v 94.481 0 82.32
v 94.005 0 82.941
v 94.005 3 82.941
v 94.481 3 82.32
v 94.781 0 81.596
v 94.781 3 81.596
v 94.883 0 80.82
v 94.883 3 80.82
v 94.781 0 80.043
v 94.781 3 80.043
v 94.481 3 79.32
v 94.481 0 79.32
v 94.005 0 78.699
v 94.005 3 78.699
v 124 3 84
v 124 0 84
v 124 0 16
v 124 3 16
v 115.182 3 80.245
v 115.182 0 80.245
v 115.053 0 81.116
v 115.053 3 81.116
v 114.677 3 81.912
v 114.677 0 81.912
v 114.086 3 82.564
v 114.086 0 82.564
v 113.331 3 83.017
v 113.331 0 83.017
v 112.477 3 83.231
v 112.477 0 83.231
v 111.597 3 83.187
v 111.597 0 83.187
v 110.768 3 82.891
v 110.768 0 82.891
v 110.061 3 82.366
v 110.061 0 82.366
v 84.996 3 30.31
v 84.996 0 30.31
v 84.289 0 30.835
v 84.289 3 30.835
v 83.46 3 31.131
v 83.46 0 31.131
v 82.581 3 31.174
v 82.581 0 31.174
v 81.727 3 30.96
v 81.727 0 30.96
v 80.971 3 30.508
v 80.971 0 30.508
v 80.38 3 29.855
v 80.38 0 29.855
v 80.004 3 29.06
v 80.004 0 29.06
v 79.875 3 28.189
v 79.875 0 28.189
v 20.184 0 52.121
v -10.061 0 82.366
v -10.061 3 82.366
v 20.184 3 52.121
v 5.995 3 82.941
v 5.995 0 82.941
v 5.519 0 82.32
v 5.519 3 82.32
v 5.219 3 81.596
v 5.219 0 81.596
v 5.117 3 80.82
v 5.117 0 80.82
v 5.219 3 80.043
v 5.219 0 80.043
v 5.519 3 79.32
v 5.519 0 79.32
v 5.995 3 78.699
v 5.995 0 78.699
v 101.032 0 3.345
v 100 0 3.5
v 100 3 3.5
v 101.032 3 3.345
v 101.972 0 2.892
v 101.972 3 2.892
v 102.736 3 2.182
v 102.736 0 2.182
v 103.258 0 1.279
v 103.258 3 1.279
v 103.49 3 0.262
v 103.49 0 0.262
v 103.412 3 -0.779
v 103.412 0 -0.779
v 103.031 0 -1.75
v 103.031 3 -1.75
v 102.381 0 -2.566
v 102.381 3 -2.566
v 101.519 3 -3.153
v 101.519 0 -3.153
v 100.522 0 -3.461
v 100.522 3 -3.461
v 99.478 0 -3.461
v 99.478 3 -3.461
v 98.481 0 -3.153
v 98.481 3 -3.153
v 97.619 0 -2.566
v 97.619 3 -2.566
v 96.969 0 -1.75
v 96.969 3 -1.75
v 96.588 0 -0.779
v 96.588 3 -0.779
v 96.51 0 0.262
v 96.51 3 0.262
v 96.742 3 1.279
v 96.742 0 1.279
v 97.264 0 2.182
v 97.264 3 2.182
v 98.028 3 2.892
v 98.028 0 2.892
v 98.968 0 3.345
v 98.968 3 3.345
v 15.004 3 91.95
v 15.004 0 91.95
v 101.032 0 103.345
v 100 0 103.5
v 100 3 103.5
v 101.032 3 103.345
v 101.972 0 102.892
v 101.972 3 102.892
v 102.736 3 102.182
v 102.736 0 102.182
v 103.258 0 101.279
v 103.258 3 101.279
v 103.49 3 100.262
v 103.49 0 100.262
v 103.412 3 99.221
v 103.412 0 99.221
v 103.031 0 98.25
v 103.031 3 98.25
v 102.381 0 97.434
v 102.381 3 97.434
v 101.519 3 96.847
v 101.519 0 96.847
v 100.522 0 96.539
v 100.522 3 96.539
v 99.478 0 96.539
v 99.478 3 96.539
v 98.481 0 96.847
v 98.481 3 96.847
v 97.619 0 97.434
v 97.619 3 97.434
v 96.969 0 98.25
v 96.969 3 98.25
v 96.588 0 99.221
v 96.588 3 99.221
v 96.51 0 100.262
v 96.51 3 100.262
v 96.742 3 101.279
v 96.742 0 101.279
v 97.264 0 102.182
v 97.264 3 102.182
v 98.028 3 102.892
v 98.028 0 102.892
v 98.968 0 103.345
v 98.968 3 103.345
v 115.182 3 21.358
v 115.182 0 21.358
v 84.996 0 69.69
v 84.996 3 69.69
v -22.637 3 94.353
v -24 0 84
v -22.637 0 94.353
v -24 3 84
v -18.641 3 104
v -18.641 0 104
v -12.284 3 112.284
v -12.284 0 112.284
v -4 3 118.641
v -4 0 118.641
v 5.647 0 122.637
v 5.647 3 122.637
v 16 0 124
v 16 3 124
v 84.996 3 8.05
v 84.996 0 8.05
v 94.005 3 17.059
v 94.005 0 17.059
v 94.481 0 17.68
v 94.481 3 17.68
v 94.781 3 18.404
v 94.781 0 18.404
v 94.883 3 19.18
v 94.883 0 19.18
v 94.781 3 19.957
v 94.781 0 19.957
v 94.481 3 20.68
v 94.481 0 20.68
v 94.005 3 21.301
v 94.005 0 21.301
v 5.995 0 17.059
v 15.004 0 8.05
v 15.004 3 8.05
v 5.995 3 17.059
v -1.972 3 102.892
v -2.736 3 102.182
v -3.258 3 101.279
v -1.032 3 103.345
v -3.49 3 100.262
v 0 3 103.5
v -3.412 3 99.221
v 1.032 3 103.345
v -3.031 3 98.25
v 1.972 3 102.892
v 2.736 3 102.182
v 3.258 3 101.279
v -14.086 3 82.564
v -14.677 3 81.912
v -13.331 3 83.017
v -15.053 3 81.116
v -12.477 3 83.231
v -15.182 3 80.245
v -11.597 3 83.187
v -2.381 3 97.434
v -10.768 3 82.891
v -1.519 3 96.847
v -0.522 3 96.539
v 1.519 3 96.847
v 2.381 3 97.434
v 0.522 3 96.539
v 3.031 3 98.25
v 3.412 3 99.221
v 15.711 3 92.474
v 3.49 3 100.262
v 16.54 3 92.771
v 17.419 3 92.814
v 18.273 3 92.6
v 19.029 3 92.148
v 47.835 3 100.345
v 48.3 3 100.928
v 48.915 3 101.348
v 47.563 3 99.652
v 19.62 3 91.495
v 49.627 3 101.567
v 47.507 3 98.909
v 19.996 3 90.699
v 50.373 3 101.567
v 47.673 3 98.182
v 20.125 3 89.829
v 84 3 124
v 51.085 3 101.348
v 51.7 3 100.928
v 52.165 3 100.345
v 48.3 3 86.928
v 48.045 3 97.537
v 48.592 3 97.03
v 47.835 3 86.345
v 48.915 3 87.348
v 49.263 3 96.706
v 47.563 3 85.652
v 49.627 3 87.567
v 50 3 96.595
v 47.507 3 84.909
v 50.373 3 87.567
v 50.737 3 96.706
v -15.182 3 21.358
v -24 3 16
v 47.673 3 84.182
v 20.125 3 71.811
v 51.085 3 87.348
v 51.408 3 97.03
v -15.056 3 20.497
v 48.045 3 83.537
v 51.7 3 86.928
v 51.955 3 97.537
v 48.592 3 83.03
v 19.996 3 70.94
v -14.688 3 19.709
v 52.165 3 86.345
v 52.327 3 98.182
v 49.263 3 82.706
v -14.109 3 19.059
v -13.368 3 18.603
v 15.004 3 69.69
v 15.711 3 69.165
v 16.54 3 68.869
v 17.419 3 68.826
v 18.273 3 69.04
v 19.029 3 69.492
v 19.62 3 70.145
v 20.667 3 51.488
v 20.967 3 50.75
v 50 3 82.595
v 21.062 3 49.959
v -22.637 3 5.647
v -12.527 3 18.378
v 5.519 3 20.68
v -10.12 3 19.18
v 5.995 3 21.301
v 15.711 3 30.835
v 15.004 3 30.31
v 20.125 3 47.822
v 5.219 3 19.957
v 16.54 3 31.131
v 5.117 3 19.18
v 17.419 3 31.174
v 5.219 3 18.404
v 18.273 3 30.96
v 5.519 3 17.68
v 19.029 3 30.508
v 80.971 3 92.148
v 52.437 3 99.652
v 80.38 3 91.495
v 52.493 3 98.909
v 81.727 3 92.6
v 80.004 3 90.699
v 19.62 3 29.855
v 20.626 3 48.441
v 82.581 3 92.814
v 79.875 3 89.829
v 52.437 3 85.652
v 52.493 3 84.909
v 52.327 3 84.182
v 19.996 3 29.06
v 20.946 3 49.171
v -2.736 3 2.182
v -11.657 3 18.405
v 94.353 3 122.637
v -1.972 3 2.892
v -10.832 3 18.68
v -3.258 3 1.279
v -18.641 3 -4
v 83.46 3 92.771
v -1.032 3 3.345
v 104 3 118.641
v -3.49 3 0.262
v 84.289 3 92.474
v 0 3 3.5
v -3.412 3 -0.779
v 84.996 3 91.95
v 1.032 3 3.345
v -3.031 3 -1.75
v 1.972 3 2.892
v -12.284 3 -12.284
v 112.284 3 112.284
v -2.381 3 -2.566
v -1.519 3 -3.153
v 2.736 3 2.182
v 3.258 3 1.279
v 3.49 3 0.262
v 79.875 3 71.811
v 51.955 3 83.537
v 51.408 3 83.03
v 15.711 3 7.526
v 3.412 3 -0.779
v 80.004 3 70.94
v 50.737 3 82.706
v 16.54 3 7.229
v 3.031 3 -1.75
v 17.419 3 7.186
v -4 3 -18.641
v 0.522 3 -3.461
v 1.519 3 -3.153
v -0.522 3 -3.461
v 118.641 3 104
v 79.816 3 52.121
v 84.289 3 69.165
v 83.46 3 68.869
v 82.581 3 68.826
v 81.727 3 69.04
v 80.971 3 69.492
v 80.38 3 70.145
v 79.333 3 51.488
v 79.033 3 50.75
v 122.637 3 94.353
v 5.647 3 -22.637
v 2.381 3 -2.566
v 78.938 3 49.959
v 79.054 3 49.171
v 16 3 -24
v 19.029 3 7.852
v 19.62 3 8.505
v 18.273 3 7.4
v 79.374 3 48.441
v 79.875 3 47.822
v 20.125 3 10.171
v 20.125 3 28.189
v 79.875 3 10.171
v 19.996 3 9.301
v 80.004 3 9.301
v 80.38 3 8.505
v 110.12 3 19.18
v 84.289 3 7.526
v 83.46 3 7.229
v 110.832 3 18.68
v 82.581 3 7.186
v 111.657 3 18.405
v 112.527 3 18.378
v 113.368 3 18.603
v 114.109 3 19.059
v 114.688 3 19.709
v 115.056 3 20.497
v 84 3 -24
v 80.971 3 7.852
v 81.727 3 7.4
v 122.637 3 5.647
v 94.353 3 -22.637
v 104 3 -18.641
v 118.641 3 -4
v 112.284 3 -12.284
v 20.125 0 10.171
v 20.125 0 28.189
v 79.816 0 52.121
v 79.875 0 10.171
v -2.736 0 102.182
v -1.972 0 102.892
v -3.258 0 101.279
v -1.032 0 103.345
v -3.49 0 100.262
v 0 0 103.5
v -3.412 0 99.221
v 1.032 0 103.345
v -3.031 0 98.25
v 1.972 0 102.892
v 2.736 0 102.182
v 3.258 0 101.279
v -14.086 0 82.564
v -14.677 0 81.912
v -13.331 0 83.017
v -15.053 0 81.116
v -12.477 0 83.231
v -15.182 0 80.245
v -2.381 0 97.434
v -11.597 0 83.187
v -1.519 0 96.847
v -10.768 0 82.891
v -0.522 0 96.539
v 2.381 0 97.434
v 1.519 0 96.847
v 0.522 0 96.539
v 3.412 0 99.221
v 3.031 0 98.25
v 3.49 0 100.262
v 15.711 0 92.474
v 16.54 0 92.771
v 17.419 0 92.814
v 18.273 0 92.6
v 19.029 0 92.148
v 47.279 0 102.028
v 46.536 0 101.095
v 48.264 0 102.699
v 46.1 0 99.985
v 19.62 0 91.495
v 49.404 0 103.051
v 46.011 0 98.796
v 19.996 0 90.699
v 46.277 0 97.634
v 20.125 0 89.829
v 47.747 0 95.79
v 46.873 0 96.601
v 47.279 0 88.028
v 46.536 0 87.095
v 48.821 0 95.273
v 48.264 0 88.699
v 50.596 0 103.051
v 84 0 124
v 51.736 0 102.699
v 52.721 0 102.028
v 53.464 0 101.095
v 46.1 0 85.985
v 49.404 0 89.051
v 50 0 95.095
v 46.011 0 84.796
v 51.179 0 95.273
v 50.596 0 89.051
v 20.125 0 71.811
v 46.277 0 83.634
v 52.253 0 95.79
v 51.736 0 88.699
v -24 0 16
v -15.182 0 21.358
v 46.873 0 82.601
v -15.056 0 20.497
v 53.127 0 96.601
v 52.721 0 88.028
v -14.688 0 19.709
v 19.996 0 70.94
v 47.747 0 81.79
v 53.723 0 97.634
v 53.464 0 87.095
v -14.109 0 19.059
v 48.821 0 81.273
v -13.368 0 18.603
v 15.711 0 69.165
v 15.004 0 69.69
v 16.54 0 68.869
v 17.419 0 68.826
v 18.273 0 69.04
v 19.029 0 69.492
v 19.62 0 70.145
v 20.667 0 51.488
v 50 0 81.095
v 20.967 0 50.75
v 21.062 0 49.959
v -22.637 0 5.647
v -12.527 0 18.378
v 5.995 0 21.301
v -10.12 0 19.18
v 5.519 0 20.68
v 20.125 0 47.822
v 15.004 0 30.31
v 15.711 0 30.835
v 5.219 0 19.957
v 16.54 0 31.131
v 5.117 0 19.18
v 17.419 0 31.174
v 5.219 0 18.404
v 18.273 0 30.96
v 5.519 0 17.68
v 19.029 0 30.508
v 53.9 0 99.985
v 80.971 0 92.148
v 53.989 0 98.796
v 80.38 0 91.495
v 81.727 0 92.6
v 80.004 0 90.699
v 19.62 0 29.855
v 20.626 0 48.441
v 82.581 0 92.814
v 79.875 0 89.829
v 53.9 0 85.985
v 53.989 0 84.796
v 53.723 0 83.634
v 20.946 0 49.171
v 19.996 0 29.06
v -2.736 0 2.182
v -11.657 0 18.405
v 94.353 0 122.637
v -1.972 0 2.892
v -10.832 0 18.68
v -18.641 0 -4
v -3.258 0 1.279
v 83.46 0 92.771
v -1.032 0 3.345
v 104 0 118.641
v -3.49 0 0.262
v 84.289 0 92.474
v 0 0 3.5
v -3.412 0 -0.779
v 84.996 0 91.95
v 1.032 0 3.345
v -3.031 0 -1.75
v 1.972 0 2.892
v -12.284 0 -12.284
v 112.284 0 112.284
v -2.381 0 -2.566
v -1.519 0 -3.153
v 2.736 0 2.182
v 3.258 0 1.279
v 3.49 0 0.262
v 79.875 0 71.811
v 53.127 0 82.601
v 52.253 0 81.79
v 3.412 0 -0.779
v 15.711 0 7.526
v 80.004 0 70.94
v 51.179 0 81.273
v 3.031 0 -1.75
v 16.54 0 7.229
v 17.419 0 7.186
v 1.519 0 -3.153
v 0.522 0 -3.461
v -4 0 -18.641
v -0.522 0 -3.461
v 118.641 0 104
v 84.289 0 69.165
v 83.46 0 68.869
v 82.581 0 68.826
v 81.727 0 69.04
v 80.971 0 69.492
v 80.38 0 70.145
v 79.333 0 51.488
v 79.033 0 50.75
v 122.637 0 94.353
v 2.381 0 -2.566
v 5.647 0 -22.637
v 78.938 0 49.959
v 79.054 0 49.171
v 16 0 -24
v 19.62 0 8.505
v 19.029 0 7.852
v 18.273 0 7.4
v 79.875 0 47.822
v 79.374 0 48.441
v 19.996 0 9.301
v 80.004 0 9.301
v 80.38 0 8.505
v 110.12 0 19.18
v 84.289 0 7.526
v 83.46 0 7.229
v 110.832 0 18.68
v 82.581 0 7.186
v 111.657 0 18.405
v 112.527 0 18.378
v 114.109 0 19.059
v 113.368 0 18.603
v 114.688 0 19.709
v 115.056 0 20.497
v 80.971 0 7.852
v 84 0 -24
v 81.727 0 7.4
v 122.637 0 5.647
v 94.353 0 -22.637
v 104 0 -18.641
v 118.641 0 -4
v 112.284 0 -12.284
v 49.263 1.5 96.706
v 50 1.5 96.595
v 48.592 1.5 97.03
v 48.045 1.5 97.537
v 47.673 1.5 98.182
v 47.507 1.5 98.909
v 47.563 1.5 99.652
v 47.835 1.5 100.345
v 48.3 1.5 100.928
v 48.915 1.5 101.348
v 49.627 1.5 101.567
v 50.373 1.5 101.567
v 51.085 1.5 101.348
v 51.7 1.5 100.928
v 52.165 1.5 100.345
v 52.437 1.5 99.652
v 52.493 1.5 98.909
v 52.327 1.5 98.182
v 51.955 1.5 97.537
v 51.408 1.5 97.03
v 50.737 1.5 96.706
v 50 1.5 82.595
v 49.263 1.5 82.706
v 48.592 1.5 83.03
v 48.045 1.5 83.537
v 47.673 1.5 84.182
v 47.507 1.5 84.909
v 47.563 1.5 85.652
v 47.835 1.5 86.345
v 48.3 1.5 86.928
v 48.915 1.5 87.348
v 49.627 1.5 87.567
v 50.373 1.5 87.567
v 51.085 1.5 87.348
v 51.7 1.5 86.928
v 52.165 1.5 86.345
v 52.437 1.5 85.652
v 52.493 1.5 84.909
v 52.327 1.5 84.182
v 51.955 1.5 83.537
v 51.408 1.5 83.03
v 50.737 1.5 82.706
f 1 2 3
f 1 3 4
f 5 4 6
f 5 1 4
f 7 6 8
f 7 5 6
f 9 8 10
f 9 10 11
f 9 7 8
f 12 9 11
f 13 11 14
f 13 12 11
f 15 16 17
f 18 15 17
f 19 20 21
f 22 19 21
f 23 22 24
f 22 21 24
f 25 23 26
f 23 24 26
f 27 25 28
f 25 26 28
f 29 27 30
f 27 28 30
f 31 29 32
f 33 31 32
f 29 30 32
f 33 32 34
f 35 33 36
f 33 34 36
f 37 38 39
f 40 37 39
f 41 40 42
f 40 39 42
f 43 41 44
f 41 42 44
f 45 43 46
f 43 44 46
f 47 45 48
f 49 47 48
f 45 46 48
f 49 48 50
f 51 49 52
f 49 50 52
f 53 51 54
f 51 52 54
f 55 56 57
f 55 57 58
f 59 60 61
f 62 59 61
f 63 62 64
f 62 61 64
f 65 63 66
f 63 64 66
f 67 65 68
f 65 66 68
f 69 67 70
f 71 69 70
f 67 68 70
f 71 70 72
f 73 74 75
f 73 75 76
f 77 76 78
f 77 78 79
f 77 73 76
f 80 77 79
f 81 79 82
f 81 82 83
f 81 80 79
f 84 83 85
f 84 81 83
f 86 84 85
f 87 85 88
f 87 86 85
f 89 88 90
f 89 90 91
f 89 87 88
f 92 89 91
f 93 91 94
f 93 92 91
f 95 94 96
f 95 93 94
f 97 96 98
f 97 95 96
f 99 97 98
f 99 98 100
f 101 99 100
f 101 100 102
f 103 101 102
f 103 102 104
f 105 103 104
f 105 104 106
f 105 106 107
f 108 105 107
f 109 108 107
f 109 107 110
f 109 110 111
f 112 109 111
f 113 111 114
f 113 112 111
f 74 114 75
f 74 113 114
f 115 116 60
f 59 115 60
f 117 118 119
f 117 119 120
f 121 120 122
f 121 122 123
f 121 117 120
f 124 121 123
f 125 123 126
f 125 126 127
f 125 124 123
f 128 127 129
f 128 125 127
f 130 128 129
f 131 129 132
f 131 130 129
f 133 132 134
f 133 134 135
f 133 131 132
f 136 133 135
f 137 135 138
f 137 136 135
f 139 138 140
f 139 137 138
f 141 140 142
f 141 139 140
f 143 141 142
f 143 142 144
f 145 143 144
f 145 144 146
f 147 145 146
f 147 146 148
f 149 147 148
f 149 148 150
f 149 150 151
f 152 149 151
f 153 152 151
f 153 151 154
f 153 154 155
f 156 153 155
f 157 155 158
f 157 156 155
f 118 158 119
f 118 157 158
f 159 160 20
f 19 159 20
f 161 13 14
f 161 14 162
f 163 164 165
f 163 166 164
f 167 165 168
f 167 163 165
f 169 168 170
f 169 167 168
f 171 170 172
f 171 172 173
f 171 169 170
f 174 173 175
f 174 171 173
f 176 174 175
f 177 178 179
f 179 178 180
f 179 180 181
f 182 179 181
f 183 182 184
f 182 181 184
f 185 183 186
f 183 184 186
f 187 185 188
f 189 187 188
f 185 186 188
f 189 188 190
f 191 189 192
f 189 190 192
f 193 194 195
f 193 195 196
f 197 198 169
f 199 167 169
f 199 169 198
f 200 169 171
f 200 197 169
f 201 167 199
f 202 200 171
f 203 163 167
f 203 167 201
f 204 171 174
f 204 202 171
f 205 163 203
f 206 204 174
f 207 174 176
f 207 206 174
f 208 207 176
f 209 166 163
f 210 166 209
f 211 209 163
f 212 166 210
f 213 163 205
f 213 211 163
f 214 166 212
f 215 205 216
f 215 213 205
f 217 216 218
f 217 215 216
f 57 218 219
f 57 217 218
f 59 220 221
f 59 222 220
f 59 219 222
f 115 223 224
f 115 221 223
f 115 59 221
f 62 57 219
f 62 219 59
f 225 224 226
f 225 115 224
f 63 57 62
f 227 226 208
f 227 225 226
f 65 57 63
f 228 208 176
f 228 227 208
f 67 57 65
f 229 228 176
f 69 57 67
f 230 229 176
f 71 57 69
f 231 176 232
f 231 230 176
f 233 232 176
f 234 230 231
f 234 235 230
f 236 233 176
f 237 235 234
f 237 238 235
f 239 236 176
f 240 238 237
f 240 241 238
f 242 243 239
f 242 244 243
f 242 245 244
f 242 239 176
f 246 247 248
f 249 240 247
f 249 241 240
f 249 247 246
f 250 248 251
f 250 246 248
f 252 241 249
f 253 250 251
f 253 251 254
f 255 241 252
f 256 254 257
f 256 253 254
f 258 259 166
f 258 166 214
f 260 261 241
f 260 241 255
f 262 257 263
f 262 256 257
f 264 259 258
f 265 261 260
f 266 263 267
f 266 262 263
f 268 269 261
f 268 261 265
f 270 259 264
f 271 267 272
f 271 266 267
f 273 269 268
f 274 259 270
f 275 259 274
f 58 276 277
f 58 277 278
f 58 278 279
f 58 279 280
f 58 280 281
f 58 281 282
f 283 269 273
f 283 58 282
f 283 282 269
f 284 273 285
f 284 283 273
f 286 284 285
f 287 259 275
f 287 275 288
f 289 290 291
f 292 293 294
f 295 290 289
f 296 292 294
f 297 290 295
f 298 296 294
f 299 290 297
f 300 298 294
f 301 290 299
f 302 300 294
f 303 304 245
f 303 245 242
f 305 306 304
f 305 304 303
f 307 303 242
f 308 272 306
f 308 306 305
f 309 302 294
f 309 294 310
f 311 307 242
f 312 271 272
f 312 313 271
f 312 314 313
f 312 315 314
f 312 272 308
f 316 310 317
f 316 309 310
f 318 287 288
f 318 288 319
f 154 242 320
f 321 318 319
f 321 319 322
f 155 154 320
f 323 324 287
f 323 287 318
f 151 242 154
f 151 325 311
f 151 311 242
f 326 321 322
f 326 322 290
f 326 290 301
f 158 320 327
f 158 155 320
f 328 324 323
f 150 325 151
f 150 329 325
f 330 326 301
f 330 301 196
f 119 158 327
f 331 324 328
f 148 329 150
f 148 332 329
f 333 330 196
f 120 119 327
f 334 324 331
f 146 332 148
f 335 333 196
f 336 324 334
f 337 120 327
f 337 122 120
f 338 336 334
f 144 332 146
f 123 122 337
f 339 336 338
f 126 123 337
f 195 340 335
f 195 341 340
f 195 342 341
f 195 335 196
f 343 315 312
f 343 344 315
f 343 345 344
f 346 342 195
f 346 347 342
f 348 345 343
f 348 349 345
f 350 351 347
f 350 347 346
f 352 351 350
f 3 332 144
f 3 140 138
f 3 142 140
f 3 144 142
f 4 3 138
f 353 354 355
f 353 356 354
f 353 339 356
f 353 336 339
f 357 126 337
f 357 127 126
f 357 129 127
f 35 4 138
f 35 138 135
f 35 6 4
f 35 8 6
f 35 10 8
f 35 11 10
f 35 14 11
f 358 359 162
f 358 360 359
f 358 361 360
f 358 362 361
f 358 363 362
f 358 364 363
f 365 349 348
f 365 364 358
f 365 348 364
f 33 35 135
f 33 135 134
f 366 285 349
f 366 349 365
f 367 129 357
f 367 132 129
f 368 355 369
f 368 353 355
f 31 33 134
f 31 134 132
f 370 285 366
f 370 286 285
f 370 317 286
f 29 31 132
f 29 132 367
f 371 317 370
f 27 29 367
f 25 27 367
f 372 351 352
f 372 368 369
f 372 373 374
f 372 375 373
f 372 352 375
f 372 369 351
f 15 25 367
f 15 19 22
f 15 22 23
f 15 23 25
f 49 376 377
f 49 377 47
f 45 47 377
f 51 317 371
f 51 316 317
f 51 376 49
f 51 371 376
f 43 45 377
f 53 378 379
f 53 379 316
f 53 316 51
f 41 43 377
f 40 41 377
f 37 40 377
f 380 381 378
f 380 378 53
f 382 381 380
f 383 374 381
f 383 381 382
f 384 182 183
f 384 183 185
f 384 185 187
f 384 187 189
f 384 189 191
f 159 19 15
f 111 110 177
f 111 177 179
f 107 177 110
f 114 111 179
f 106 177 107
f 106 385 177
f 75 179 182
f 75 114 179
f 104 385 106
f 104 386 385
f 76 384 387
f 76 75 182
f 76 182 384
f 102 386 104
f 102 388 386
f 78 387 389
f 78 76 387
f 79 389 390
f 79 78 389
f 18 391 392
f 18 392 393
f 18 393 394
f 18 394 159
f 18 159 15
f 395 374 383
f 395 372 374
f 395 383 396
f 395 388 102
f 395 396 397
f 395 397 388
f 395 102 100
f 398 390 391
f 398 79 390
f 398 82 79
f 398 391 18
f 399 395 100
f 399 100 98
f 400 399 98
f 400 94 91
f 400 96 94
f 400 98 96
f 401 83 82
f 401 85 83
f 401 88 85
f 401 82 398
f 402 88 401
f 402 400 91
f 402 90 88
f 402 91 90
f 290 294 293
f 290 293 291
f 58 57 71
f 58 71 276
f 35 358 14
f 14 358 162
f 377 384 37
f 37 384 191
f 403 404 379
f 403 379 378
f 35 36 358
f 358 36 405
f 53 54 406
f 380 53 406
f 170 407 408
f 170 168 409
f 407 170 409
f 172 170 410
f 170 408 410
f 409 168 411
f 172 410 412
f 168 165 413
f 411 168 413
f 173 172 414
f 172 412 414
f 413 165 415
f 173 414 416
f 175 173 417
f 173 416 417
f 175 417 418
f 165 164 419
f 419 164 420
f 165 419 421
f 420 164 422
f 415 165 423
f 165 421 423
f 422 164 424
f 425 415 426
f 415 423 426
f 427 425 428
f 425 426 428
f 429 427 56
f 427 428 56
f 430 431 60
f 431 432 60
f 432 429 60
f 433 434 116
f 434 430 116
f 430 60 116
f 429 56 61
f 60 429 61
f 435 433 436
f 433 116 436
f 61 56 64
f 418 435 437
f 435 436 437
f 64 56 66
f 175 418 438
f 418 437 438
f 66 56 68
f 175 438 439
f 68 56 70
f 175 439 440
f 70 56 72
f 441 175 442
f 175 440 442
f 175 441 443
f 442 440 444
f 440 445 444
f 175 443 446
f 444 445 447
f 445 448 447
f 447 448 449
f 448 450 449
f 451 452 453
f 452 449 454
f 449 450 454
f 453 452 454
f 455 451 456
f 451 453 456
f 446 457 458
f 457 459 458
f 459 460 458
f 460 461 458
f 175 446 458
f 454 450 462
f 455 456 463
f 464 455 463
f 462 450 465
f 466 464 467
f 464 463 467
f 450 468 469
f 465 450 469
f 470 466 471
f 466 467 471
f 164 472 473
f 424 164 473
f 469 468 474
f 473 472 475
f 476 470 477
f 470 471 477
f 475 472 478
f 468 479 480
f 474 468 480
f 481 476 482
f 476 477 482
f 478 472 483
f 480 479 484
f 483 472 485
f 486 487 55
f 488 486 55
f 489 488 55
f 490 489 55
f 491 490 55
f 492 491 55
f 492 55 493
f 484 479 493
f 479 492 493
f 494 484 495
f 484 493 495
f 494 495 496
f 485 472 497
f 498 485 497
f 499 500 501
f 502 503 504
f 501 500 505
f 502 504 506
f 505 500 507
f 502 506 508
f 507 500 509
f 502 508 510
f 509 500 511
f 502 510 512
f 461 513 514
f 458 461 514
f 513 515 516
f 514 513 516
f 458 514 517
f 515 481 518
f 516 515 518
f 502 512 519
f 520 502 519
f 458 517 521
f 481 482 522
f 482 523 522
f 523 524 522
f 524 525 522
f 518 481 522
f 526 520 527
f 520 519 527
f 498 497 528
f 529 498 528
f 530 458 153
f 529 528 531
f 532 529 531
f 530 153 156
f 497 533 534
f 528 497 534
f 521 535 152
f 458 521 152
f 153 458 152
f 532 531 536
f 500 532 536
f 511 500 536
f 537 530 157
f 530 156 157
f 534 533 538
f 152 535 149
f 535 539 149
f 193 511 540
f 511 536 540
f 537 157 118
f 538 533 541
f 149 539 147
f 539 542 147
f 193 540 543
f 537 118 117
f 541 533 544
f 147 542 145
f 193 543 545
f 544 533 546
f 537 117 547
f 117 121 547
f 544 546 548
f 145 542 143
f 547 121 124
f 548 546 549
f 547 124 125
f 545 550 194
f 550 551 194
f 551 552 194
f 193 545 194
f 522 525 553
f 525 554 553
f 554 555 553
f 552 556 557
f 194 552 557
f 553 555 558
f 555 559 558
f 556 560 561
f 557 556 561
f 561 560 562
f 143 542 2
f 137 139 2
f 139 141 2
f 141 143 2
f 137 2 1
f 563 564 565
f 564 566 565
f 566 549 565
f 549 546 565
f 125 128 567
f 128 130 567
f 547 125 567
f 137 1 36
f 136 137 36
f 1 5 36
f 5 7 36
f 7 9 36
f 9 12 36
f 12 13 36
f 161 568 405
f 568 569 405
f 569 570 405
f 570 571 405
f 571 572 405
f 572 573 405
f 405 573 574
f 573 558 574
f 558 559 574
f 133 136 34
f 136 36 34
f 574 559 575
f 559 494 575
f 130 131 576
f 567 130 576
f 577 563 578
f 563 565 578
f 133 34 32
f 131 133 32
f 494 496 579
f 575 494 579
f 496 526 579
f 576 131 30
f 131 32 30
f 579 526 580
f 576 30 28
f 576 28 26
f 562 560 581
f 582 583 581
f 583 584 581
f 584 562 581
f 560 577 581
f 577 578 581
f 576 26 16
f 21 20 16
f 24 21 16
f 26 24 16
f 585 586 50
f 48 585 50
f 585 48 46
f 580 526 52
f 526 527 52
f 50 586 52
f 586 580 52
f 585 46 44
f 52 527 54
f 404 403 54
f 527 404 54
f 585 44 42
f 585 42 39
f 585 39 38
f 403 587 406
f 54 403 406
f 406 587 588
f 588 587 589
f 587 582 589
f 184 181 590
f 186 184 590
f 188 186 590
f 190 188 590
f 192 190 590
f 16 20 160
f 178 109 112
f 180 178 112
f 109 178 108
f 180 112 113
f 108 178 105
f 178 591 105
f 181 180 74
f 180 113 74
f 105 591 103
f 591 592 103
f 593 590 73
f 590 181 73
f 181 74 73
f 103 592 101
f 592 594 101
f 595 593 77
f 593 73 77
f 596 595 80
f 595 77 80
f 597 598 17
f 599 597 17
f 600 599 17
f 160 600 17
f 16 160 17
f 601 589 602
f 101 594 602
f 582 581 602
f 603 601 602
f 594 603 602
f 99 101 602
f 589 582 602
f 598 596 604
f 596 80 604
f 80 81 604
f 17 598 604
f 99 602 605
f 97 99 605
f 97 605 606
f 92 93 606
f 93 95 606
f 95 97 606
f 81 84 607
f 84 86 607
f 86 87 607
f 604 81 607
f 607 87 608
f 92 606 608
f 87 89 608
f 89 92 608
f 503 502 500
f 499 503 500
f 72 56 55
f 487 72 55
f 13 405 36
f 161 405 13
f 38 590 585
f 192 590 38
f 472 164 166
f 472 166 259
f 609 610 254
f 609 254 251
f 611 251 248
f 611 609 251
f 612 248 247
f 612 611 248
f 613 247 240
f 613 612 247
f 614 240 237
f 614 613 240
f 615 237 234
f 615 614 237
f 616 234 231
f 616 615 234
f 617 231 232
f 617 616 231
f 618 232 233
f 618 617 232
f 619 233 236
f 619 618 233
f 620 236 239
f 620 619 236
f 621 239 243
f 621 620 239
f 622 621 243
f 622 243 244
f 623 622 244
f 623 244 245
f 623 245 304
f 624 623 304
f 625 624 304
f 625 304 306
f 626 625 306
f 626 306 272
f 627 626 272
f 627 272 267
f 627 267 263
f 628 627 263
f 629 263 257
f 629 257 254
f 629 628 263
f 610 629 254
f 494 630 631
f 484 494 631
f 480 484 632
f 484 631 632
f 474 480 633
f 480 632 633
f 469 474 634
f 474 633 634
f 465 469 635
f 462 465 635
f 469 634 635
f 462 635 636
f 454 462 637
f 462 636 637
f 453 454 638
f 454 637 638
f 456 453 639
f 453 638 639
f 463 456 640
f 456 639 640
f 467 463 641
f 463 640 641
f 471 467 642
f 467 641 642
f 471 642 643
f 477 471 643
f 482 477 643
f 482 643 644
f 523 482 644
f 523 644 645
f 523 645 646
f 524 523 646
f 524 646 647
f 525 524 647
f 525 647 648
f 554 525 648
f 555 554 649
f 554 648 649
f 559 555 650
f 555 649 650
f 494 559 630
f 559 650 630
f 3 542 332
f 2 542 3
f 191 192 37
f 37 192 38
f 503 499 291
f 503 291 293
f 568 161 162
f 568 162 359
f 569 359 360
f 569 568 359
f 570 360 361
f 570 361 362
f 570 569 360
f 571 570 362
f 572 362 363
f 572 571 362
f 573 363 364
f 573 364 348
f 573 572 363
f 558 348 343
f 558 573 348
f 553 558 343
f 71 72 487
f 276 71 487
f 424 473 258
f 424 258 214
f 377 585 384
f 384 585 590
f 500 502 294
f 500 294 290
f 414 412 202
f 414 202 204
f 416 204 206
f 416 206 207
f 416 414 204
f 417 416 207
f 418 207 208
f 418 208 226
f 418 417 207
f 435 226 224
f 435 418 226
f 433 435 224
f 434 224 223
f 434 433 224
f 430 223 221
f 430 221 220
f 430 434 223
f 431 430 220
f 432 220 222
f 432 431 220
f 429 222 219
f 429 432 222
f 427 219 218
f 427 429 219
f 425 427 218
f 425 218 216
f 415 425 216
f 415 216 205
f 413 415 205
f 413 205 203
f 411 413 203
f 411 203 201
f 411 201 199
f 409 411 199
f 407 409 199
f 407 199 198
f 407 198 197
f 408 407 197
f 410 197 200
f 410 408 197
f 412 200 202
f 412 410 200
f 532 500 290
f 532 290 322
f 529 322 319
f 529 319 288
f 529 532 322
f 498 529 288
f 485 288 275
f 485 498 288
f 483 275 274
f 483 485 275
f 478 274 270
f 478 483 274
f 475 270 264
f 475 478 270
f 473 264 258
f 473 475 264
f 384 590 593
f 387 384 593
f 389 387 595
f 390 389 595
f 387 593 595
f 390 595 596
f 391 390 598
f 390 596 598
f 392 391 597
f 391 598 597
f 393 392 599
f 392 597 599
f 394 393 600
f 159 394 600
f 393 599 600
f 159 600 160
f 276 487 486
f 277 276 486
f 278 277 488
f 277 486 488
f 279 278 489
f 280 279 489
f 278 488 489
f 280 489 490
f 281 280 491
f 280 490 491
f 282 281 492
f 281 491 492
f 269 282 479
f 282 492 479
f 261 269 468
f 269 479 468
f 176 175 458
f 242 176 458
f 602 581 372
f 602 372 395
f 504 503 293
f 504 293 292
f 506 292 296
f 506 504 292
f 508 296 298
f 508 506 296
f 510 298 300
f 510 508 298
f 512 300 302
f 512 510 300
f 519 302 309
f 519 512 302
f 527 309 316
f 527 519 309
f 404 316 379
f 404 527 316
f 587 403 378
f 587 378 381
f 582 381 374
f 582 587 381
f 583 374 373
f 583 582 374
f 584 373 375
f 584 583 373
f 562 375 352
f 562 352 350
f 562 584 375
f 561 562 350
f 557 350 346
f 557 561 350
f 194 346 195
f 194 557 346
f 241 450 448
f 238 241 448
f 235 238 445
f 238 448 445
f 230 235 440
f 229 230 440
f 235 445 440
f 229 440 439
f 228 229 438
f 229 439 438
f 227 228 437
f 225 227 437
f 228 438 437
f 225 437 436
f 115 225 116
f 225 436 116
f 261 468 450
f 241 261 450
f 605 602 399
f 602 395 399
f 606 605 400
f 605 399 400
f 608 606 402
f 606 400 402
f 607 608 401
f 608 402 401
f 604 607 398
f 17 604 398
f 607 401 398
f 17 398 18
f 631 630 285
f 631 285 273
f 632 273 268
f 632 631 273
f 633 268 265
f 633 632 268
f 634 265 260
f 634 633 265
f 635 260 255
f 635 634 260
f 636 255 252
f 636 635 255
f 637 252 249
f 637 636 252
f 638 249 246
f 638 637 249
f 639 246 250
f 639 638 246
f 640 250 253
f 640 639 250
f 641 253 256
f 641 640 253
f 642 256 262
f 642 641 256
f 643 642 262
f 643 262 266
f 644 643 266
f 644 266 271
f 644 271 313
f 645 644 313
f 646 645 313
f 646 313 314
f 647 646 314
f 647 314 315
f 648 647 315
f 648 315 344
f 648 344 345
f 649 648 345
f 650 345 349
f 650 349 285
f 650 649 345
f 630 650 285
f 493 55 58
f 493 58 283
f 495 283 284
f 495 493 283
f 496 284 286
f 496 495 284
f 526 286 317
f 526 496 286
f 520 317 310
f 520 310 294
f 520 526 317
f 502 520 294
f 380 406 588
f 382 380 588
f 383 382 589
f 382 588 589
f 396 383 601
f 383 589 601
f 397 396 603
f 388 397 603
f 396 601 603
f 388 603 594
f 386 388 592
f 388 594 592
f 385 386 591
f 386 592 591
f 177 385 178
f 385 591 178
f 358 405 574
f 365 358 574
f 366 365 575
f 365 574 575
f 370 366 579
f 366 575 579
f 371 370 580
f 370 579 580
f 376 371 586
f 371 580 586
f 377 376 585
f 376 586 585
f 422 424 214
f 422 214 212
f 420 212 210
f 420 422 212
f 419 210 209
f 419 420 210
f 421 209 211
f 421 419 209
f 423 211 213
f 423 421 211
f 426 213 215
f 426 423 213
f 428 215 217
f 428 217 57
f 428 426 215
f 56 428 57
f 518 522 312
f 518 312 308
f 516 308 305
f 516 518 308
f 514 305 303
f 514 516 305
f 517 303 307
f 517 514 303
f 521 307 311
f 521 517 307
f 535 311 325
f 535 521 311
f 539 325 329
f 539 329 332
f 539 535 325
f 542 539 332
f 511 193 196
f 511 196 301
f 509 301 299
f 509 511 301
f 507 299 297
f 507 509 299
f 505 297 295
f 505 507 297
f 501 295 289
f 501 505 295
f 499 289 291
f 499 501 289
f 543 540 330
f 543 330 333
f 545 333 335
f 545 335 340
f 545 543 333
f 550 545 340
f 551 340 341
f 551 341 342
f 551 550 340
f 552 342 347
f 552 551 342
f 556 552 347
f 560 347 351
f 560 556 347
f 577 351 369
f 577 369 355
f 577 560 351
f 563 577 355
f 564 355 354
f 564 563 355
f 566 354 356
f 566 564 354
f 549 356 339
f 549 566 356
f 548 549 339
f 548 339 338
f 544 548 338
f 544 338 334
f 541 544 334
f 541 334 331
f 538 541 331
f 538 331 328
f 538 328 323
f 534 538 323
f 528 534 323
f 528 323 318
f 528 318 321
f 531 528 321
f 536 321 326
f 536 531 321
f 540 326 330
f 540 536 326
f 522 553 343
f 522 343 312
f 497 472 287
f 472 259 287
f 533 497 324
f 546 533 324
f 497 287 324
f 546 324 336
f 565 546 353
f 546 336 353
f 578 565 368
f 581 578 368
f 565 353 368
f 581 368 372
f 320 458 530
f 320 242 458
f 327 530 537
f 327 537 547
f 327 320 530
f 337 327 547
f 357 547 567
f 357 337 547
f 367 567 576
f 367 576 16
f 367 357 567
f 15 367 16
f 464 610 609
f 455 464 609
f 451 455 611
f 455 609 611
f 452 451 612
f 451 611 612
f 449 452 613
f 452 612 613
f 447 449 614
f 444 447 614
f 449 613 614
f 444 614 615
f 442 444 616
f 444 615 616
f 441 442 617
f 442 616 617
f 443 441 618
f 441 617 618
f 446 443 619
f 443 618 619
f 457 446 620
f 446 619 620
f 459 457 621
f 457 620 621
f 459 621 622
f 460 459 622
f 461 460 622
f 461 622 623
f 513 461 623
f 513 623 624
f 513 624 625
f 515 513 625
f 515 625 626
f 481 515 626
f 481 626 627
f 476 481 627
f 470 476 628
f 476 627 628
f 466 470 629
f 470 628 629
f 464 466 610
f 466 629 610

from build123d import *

# Parameters (mm, degrees)
SKETCH2_W           = 148
SKETCH2_H           = 148
SKETCH2_R           = 3.5
SKETCH2_R_2         = 2.5
BOSS_EXTRUDE1_DEPTH = 3
FILLET1_R           = 40
CHAMFER1_SIZE       = 1.5
SKETCH3_W           = 25.243080612
SKETCH3_H           = 38.292469741
BOSS_EXTRUDE2_DEPTH = 3


with BuildPart() as part:
    # Sketch2 → Boss-Extrude1 (new body)
    with BuildSketch(Plane(origin=(0, 0, 0), x_dir=(1, 0, 0), z_dir=(0, 1, 0))):
        with Locations((50, -50)):
            Rectangle(SKETCH2_W, SKETCH2_H)
        with Locations(Location((0, 0, 0), (0, 0, 270))):
            Circle(SKETCH2_R, mode=Mode.SUBTRACT)
        with Locations(Location((0, -100, 0), (0, 0, 270))):
            Circle(SKETCH2_R, mode=Mode.SUBTRACT)
        with Locations(Location((100, 0, 0), (0, 0, 270))):
            Circle(SKETCH2_R, mode=Mode.SUBTRACT)
        with Locations(Location((100, -100, 0), (0, 0, 270))):
            Circle(SKETCH2_R, mode=Mode.SUBTRACT)
        with Locations(Location((50, -0.904618286, 0), (0, 0, 270))):
            Circle(SKETCH2_R_2, mode=Mode.SUBTRACT)
        with Locations(Location((50, -14.904618286, 0), (0, 0, 270))):
            Circle(SKETCH2_R_2, mode=Mode.SUBTRACT)
        with Locations(Location((50, -99.095381714, 0), (0, 0, 90))):
            Circle(SKETCH2_R_2, mode=Mode.SUBTRACT)
        with Locations(Location((50, -85.095381714, 0), (0, 0, 90))):
            Circle(SKETCH2_R_2, mode=Mode.SUBTRACT)
        with BuildLine():
            Line((-15.182460642, -21.358338014), (-15.182460642, -80.245012021))
            ThreePointArc((-15.182460642, -80.245012021), (-13.330510939, -83.016650619), (-10.061140298, -82.366332365))
            Line((-10.061140298, -82.366332365), (20.183871723, -52.121320344))
            ThreePointArc((20.183871723, -52.121320344), (21.062273515, -49.959169765), (20.125348516, -47.821728214))
            Line((20.125348516, -47.821728214), (-10.119663505, -19.180066228))
            ThreePointArc((-10.119663505, -19.180066228), (-13.368126824, -18.602581184), (-15.182460642, -21.358338014))
        make_face(mode=Mode.SUBTRACT)
        with BuildLine():
            Line((110.061140298, -82.366332365), (79.816128277, -52.121320344))
            ThreePointArc((79.816128277, -52.121320344), (78.937726485, -49.959169765), (79.874651484, -47.821728214))
            Line((79.874651484, -47.821728214), (110.119663505, -19.180066228))
            ThreePointArc((110.119663505, -19.180066228), (113.368126824, -18.602581184), (115.182460642, -21.358338014))
            Line((115.182460642, -21.358338014), (115.182460642, -80.245012021))
            ThreePointArc((115.182460642, -80.245012021), (113.330510939, -83.016650619), (110.061140298, -82.366332365))
        make_face(mode=Mode.SUBTRACT)
        with BuildLine():
            Line((5.995336985, -21.301386572), (15.004028172, -30.310077759))
            ThreePointArc((15.004028172, -30.310077759), (18.273398813, -30.960396013), (20.125348516, -28.188757415))
            Line((20.125348516, -28.188757415), (20.125348516, -10.171375041))
            ThreePointArc((20.125348516, -10.171375041), (18.273398813, -7.399736444), (15.004028172, -8.050054698))
            Line((15.004028172, -8.050054698), (5.995336985, -17.058745885))
            ThreePointArc((5.995336985, -17.058745885), (5.116657329, -19.180066228), (5.995336985, -21.301386572))
        make_face(mode=Mode.SUBTRACT)
        with BuildLine():
            Line((5.995336985, -78.698613428), (15.004028172, -69.689922241))
            ThreePointArc((15.004028172, -69.689922241), (18.273398813, -69.039603987), (20.125348516, -71.811242585))
            Line((20.125348516, -71.811242585), (20.125348516, -89.828624959))
            ThreePointArc((20.125348516, -89.828624959), (18.273398813, -92.600263556), (15.004028172, -91.949945302))
            Line((15.004028172, -91.949945302), (5.995336985, -82.941254115))
            ThreePointArc((5.995336985, -82.941254115), (5.116657329, -80.819933772), (5.995336985, -78.698613428))
        make_face(mode=Mode.SUBTRACT)
        with BuildLine():
            Line((79.874651484, -71.811242585), (79.874651484, -89.828624959))
            ThreePointArc((79.874651484, -89.828624959), (81.726601187, -92.600263556), (84.995971828, -91.949945302))
            Line((84.995971828, -91.949945302), (94.004663015, -82.941254115))
            ThreePointArc((94.004663015, -82.941254115), (94.883342671, -80.819933772), (94.004663015, -78.698613428))
            Line((94.004663015, -78.698613428), (84.995971828, -69.689922241))
            ThreePointArc((84.995971828, -69.689922241), (81.726601187, -69.039603987), (79.874651484, -71.811242585))
        make_face(mode=Mode.SUBTRACT)
        with BuildLine():
            Line((94.004663015, -21.301386572), (84.995971828, -30.310077759))
            ThreePointArc((84.995971828, -30.310077759), (81.726601187, -30.960396013), (79.874651484, -28.188757415))
            Line((79.874651484, -28.188757415), (79.874651484, -10.171375041))
            ThreePointArc((79.874651484, -10.171375041), (81.726601187, -7.399736444), (84.995971828, -8.050054698))
            Line((84.995971828, -8.050054698), (94.004663015, -17.058745885))
            ThreePointArc((94.004663015, -17.058745885), (94.883342671, -19.180066228), (94.004663015, -21.301386572))
        make_face(mode=Mode.SUBTRACT)
    extrude(amount=BOSS_EXTRUDE1_DEPTH)

    # Fillet1
    fillet1_edges = [part.edges().sort_by_distance(p)[0] for p in [
        (124, 1.5, 124),
        (-24, 1.5, 124),
        (-24, 1.5, -24),
        (124, 1.5, -24),
    ]]
    fillet(fillet1_edges, radius=FILLET1_R)

    # Chamfer1
    chamfer1_edges = [part.edges().sort_by_distance(p)[0] for p in [
        (50, 0, -1.595381714),
        (50, 0, 12.404618286),
        (50, 0, 101.595381714),
        (50, 0, 87.595381714),
    ]]
    chamfer(chamfer1_edges, length=CHAMFER1_SIZE)

    # Sketch3 → Boss-Extrude2 (add)
    with BuildSketch(Plane(origin=(0, 3, 0), x_dir=(1, 0, 0), z_dir=(0, 1, 0))):
        with Locations((50.641773236, -8.177777461)):
            Rectangle(SKETCH3_W, SKETCH3_H)
    extrude(amount=-BOSS_EXTRUDE2_DEPTH)


solid = part.part
